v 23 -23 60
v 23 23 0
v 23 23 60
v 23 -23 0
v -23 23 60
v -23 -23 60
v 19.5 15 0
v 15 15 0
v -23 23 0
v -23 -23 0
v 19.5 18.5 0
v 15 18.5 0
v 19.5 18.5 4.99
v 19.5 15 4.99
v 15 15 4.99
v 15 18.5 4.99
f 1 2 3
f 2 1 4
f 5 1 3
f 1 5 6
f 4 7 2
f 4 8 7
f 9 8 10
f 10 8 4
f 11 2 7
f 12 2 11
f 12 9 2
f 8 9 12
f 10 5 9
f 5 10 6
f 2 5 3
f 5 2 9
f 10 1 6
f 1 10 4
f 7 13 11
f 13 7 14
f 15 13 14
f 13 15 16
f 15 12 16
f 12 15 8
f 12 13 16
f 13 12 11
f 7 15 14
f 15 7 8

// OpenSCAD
difference(){
translate([-23,-23,0])cube([46,46,60]);
translate([15,15,-.01])cube([4.5,3.5,5]);
}
